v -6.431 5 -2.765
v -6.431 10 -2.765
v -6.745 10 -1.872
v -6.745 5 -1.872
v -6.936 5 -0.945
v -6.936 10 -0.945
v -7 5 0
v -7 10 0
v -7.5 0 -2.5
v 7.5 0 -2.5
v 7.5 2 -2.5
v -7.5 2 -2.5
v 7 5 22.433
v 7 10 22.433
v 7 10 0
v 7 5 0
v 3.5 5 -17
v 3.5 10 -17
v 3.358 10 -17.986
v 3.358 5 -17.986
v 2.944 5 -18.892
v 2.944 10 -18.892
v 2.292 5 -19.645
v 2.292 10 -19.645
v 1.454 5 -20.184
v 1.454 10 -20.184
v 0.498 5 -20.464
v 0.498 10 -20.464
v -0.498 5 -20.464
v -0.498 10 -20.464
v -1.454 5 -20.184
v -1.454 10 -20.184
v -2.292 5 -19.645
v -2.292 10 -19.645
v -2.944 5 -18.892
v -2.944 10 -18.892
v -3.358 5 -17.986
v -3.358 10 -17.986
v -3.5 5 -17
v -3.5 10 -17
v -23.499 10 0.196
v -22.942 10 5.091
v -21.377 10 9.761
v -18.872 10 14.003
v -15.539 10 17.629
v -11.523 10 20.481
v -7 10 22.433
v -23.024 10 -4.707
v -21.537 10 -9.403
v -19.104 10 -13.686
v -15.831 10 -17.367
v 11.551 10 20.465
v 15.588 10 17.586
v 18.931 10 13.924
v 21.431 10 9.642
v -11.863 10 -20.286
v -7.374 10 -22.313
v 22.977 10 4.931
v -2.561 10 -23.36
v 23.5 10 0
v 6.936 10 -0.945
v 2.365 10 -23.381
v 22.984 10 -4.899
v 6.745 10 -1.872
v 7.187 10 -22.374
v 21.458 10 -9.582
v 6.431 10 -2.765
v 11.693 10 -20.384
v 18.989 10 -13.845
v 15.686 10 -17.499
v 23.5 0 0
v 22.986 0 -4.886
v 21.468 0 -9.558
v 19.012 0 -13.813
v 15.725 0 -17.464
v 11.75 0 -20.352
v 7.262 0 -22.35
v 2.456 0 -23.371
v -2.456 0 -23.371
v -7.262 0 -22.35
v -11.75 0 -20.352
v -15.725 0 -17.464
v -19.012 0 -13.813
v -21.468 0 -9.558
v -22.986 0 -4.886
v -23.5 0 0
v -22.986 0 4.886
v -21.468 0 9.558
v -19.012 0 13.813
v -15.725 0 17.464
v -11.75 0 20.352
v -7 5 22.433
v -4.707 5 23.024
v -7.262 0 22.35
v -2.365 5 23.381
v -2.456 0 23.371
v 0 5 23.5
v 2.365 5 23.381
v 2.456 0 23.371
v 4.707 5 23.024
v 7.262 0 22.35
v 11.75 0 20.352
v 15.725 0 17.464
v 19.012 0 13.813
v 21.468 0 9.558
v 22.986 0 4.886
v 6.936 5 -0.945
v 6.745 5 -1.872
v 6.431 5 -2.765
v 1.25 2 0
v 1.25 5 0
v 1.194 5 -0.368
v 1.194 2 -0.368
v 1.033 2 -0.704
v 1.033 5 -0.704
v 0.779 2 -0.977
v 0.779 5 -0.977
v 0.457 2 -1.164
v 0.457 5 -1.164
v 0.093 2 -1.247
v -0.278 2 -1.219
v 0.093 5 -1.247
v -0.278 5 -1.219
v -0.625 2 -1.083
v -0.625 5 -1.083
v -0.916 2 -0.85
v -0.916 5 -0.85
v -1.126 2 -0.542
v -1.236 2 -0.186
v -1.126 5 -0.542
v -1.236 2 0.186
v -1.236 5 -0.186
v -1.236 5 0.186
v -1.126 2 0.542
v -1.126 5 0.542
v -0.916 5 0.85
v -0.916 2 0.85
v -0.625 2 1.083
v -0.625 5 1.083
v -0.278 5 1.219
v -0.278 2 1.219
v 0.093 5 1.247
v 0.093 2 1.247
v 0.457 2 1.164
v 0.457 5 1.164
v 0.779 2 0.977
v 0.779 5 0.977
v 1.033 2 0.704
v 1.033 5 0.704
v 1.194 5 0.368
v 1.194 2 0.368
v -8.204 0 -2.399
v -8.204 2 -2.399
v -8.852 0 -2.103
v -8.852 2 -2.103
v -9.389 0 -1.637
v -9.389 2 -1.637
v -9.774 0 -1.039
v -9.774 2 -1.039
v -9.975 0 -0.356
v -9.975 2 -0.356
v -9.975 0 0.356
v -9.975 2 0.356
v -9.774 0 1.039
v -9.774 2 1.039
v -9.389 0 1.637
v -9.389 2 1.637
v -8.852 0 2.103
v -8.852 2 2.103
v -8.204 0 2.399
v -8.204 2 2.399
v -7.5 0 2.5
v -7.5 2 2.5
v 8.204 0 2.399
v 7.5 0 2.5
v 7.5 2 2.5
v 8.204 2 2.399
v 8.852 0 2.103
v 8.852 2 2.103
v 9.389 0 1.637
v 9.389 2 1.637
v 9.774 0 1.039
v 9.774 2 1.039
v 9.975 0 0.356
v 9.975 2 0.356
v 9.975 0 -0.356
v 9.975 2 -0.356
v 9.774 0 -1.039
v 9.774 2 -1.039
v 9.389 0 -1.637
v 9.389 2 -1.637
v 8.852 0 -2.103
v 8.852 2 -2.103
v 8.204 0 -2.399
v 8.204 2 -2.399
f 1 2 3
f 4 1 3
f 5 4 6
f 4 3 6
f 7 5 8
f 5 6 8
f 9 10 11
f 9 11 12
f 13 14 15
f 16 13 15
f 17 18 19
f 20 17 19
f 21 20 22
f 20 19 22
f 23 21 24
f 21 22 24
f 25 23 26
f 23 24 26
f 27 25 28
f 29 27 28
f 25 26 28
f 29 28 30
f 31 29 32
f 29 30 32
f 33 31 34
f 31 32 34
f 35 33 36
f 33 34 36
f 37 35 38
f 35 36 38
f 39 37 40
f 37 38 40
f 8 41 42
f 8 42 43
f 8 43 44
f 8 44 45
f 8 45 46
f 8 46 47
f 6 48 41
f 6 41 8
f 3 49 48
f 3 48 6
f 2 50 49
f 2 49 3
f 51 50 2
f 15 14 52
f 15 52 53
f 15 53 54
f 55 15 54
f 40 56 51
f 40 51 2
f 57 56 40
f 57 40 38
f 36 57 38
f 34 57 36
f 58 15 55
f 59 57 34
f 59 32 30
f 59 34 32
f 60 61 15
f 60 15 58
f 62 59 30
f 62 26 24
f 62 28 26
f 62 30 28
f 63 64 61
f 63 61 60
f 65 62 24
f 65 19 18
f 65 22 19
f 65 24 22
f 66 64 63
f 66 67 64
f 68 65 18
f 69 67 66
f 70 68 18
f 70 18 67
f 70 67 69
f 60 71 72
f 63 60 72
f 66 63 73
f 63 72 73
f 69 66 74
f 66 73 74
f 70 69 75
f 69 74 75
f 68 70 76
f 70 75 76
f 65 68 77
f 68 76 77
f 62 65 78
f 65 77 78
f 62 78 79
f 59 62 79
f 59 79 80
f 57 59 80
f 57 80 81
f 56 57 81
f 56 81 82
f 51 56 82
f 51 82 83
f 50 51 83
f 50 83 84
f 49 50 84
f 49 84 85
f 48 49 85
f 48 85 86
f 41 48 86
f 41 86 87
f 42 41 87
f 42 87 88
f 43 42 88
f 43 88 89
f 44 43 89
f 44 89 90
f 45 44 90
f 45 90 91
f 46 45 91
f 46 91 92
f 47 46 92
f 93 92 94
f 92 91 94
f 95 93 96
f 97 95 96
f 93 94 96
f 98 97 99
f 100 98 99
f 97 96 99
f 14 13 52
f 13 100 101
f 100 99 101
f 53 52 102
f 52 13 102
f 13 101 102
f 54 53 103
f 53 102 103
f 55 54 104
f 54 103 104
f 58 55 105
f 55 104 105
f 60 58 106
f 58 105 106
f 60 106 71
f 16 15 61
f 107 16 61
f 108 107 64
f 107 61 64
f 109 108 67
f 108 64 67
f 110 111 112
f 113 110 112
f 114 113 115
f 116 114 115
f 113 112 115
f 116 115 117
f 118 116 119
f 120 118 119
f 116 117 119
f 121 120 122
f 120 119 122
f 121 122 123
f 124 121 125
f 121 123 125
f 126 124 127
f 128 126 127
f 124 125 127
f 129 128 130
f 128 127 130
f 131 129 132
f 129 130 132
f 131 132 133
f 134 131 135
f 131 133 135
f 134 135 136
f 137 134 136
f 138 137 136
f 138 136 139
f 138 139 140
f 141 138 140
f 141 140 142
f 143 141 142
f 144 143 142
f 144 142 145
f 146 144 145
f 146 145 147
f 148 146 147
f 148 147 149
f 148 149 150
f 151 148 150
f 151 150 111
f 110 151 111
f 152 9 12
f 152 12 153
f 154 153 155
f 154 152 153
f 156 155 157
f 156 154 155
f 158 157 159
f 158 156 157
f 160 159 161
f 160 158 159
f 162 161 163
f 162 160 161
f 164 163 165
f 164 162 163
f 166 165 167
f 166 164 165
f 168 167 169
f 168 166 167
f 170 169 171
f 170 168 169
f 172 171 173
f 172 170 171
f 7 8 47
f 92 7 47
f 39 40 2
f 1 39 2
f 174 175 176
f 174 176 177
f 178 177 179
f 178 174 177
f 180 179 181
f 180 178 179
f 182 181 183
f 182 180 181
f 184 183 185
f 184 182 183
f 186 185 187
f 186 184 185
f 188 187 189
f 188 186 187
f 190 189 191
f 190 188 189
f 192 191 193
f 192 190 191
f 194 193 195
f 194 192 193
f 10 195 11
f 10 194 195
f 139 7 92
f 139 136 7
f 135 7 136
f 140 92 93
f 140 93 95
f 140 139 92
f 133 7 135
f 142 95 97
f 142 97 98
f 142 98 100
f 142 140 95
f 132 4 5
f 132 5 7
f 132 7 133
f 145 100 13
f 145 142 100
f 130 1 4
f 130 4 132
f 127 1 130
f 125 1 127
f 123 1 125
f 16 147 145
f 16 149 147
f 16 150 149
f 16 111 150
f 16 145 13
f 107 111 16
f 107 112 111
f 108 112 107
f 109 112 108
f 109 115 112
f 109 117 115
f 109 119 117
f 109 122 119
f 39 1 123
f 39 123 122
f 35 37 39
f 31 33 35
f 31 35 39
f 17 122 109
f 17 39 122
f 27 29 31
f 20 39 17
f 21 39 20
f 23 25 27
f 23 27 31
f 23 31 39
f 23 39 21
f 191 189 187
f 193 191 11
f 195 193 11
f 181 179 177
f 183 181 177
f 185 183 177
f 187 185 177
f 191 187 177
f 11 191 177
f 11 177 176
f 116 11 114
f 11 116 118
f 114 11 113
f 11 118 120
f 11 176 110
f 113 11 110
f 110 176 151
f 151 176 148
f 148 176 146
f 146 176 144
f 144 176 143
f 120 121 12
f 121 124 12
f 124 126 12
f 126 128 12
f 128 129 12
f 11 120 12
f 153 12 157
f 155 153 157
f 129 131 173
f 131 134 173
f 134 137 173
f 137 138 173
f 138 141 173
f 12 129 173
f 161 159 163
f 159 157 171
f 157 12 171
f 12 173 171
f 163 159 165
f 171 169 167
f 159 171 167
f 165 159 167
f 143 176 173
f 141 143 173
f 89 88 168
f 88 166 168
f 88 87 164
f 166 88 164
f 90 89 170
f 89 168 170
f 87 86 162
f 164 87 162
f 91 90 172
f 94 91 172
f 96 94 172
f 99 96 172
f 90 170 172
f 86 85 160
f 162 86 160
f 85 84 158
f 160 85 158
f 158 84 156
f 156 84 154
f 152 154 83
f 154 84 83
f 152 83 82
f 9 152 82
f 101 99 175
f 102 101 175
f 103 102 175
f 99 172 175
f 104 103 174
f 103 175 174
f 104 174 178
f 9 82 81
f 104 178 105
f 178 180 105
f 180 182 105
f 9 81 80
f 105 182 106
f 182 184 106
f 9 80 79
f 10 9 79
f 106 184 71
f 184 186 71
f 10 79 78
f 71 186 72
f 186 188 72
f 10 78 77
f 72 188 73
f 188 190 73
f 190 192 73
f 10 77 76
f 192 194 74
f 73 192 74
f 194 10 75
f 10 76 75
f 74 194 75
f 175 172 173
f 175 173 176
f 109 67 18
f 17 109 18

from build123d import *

# Parameters (mm, degrees)
CROQUIS1_R              = 23.5
SALIENTE_EXTRUIR1_DEPTH = 10
CORTAR_EXTRUIR3_DEPTH   = 5
CROQUIS3_R              = 1.25
CORTAR_EXTRUIR4_DEPTH   = 10
CORTAR_EXTRUIR6_DEPTH   = 2


with BuildPart() as part:
    # Croquis1 → Saliente-Extruir1 (new body)
    with BuildSketch(Plane(origin=(0, 0, 0), x_dir=(1, 0, 0), z_dir=(0, 1, 0))):
        Circle(CROQUIS1_R)
    extrude(amount=SALIENTE_EXTRUIR1_DEPTH)

    # Croquis2 → Cortar-Extruir3 (cut)
    with BuildSketch(Plane(origin=(0, 10, 0), x_dir=(1, 0, 0), z_dir=(0, 1, 0))):
        with BuildLine():
            ThreePointArc((3.5, 17), (0, 20.5), (-3.5, 17))
            Line((-3.5, 17), (3.5, 17))
        make_face()
        with BuildLine():
            Line((3.5, 17), (-3.5, 17))
            ThreePointArc((-3.5, 17), (0, 13.5), (3.5, 17))
        make_face()
        with BuildLine():
            Line((-3.5, 6.062177826), (-3.5, 17))
            Line((-3.5, 17), (-6.430705394, 2.765145228))
            ThreePointArc((-6.430705394, 2.765145228), (-5.231857547, 4.650555516), (-3.5, 6.062177826))
        make_face()
        with BuildLine():
            ThreePointArc((3.5, 17), (0, 13.5), (-3.5, 17))
            Line((-3.5, 17), (-3.5, 6.062177826))
            ThreePointArc((-3.5, 6.062177826), (0, 7), (3.5, 6.062177826))
            Line((3.5, 6.062177826), (3.5, 17))
        make_face()
        with BuildLine():
            Line((6.430705394, 2.765145228), (3.5, 17))
            Line((3.5, 17), (3.5, 6.062177826))
            ThreePointArc((3.5, 6.062177826), (5.231857547, 4.650555516), (6.430705394, 2.765145228))
        make_face()
        with BuildLine():
            ThreePointArc((6.430705394, 2.765145228), (5.231857547, 4.650555516), (3.5, 6.062177826))
            Line((3.5, 6.062177826), (3.5, 0))
            Line((3.5, 0), (7, 0))
            Line((7, 0), (6.430705394, 2.765145228))
        make_face()
        with BuildLine():
            ThreePointArc((3.5, 6.062177826), (0, 7), (-3.5, 6.062177826))
            Line((-3.5, 6.062177826), (-3.5, 0))
            Line((-3.5, 0), (3.5, 0))
            Line((3.5, 0), (3.5, 6.062177826))
        make_face()
        with BuildLine():
            Line((3.5, 0), (-3.5, 0))
            Line((-3.5, 0), (-3.5, -6.062177826))
            ThreePointArc((-3.5, -6.062177826), (0, -7), (3.5, -6.062177826))
            Line((3.5, -6.062177826), (3.5, 0))
        make_face()
        with BuildLine():
            ThreePointArc((-3.5, 6.062177826), (-5.231857547, 4.650555516), (-6.430705394, 2.765145228))
            Line((-6.430705394, 2.765145228), (-7, 0))
            Line((-7, 0), (-3.5, 0))
            Line((-3.5, 0), (-3.5, 6.062177826))
        make_face()
        with BuildLine():
            Line((-3.5, 0), (-7, 0))
            ThreePointArc((-7, 0), (-6.062177826, -3.5), (-3.5, -6.062177826))
            Line((-3.5, -6.062177826), (-3.5, 0))
        make_face()
        with BuildLine():
            Line((7, 0), (3.5, 0))
            Line((3.5, 0), (3.5, -6.062177826))
            ThreePointArc((3.5, -6.062177826), (6.062177826, -3.5), (7, 0))
        make_face()
        with BuildLine():
            ThreePointArc((7, 0), (6.856199303, 1.411570445), (6.430705394, 2.765145228))
            Line((6.430705394, 2.765145228), (7, 0))
        make_face()
        with BuildLine():
            Line((-7, 0), (-6.430705394, 2.765145228))
            ThreePointArc((-6.430705394, 2.765145228), (-6.856199303, 1.411570445), (-7, 0))
        make_face()
        with BuildLine():
            ThreePointArc((3.5, -6.062177826), (0, -7), (-3.5, -6.062177826))
            Line((-3.5, -6.062177826), (-3.5, -17))
            Line((-3.5, -17), (3.5, -17))
            Line((3.5, -17), (3.5, -6.062177826))
        make_face()
        with BuildLine():
            ThreePointArc((-3.5, -6.062177826), (-6.062177826, -3.5), (-7, 0))
            Line((-7, 0), (-7, -22.433234274))
            ThreePointArc((-7, -22.433234274), (-3.540409196, -23.231777864), (0, -23.5))
            ThreePointArc((0, -23.5), (3.540409196, -23.231777864), (7, -22.433234274))
            Line((7, -22.433234274), (7, 0))
            ThreePointArc((7, 0), (6.062177826, -3.5), (3.5, -6.062177826))
            Line((3.5, -6.062177826), (3.5, -17))
            Line((3.5, -17), (-3.5, -17))
            Line((-3.5, -17), (-3.5, -6.062177826))
        make_face()
    extrude(amount=-CORTAR_EXTRUIR3_DEPTH, mode=Mode.SUBTRACT)

    # Croquis3 → Cortar-Extruir4 (cut)
    with BuildSketch(Plane(origin=(0, 10, 0), x_dir=(1, 0, 0), z_dir=(0, 1, 0))):
        Circle(CROQUIS3_R)
    extrude(amount=-CORTAR_EXTRUIR4_DEPTH, mode=Mode.SUBTRACT)

    # Croquis5 → Cortar-Extruir6 (cut)
    with BuildSketch(Plane.XZ):
        with BuildLine():
            Line((-7.5, 2.5), (7.5, 2.5))
            ThreePointArc((7.5, 2.5), (10, 0), (7.5, -2.5))
            Line((7.5, -2.5), (-7.5, -2.5))
            ThreePointArc((-7.5, -2.5), (-10, 0), (-7.5, 2.5))
        make_face()
    extrude(amount=-CORTAR_EXTRUIR6_DEPTH, mode=Mode.SUBTRACT)


solid = part.part
